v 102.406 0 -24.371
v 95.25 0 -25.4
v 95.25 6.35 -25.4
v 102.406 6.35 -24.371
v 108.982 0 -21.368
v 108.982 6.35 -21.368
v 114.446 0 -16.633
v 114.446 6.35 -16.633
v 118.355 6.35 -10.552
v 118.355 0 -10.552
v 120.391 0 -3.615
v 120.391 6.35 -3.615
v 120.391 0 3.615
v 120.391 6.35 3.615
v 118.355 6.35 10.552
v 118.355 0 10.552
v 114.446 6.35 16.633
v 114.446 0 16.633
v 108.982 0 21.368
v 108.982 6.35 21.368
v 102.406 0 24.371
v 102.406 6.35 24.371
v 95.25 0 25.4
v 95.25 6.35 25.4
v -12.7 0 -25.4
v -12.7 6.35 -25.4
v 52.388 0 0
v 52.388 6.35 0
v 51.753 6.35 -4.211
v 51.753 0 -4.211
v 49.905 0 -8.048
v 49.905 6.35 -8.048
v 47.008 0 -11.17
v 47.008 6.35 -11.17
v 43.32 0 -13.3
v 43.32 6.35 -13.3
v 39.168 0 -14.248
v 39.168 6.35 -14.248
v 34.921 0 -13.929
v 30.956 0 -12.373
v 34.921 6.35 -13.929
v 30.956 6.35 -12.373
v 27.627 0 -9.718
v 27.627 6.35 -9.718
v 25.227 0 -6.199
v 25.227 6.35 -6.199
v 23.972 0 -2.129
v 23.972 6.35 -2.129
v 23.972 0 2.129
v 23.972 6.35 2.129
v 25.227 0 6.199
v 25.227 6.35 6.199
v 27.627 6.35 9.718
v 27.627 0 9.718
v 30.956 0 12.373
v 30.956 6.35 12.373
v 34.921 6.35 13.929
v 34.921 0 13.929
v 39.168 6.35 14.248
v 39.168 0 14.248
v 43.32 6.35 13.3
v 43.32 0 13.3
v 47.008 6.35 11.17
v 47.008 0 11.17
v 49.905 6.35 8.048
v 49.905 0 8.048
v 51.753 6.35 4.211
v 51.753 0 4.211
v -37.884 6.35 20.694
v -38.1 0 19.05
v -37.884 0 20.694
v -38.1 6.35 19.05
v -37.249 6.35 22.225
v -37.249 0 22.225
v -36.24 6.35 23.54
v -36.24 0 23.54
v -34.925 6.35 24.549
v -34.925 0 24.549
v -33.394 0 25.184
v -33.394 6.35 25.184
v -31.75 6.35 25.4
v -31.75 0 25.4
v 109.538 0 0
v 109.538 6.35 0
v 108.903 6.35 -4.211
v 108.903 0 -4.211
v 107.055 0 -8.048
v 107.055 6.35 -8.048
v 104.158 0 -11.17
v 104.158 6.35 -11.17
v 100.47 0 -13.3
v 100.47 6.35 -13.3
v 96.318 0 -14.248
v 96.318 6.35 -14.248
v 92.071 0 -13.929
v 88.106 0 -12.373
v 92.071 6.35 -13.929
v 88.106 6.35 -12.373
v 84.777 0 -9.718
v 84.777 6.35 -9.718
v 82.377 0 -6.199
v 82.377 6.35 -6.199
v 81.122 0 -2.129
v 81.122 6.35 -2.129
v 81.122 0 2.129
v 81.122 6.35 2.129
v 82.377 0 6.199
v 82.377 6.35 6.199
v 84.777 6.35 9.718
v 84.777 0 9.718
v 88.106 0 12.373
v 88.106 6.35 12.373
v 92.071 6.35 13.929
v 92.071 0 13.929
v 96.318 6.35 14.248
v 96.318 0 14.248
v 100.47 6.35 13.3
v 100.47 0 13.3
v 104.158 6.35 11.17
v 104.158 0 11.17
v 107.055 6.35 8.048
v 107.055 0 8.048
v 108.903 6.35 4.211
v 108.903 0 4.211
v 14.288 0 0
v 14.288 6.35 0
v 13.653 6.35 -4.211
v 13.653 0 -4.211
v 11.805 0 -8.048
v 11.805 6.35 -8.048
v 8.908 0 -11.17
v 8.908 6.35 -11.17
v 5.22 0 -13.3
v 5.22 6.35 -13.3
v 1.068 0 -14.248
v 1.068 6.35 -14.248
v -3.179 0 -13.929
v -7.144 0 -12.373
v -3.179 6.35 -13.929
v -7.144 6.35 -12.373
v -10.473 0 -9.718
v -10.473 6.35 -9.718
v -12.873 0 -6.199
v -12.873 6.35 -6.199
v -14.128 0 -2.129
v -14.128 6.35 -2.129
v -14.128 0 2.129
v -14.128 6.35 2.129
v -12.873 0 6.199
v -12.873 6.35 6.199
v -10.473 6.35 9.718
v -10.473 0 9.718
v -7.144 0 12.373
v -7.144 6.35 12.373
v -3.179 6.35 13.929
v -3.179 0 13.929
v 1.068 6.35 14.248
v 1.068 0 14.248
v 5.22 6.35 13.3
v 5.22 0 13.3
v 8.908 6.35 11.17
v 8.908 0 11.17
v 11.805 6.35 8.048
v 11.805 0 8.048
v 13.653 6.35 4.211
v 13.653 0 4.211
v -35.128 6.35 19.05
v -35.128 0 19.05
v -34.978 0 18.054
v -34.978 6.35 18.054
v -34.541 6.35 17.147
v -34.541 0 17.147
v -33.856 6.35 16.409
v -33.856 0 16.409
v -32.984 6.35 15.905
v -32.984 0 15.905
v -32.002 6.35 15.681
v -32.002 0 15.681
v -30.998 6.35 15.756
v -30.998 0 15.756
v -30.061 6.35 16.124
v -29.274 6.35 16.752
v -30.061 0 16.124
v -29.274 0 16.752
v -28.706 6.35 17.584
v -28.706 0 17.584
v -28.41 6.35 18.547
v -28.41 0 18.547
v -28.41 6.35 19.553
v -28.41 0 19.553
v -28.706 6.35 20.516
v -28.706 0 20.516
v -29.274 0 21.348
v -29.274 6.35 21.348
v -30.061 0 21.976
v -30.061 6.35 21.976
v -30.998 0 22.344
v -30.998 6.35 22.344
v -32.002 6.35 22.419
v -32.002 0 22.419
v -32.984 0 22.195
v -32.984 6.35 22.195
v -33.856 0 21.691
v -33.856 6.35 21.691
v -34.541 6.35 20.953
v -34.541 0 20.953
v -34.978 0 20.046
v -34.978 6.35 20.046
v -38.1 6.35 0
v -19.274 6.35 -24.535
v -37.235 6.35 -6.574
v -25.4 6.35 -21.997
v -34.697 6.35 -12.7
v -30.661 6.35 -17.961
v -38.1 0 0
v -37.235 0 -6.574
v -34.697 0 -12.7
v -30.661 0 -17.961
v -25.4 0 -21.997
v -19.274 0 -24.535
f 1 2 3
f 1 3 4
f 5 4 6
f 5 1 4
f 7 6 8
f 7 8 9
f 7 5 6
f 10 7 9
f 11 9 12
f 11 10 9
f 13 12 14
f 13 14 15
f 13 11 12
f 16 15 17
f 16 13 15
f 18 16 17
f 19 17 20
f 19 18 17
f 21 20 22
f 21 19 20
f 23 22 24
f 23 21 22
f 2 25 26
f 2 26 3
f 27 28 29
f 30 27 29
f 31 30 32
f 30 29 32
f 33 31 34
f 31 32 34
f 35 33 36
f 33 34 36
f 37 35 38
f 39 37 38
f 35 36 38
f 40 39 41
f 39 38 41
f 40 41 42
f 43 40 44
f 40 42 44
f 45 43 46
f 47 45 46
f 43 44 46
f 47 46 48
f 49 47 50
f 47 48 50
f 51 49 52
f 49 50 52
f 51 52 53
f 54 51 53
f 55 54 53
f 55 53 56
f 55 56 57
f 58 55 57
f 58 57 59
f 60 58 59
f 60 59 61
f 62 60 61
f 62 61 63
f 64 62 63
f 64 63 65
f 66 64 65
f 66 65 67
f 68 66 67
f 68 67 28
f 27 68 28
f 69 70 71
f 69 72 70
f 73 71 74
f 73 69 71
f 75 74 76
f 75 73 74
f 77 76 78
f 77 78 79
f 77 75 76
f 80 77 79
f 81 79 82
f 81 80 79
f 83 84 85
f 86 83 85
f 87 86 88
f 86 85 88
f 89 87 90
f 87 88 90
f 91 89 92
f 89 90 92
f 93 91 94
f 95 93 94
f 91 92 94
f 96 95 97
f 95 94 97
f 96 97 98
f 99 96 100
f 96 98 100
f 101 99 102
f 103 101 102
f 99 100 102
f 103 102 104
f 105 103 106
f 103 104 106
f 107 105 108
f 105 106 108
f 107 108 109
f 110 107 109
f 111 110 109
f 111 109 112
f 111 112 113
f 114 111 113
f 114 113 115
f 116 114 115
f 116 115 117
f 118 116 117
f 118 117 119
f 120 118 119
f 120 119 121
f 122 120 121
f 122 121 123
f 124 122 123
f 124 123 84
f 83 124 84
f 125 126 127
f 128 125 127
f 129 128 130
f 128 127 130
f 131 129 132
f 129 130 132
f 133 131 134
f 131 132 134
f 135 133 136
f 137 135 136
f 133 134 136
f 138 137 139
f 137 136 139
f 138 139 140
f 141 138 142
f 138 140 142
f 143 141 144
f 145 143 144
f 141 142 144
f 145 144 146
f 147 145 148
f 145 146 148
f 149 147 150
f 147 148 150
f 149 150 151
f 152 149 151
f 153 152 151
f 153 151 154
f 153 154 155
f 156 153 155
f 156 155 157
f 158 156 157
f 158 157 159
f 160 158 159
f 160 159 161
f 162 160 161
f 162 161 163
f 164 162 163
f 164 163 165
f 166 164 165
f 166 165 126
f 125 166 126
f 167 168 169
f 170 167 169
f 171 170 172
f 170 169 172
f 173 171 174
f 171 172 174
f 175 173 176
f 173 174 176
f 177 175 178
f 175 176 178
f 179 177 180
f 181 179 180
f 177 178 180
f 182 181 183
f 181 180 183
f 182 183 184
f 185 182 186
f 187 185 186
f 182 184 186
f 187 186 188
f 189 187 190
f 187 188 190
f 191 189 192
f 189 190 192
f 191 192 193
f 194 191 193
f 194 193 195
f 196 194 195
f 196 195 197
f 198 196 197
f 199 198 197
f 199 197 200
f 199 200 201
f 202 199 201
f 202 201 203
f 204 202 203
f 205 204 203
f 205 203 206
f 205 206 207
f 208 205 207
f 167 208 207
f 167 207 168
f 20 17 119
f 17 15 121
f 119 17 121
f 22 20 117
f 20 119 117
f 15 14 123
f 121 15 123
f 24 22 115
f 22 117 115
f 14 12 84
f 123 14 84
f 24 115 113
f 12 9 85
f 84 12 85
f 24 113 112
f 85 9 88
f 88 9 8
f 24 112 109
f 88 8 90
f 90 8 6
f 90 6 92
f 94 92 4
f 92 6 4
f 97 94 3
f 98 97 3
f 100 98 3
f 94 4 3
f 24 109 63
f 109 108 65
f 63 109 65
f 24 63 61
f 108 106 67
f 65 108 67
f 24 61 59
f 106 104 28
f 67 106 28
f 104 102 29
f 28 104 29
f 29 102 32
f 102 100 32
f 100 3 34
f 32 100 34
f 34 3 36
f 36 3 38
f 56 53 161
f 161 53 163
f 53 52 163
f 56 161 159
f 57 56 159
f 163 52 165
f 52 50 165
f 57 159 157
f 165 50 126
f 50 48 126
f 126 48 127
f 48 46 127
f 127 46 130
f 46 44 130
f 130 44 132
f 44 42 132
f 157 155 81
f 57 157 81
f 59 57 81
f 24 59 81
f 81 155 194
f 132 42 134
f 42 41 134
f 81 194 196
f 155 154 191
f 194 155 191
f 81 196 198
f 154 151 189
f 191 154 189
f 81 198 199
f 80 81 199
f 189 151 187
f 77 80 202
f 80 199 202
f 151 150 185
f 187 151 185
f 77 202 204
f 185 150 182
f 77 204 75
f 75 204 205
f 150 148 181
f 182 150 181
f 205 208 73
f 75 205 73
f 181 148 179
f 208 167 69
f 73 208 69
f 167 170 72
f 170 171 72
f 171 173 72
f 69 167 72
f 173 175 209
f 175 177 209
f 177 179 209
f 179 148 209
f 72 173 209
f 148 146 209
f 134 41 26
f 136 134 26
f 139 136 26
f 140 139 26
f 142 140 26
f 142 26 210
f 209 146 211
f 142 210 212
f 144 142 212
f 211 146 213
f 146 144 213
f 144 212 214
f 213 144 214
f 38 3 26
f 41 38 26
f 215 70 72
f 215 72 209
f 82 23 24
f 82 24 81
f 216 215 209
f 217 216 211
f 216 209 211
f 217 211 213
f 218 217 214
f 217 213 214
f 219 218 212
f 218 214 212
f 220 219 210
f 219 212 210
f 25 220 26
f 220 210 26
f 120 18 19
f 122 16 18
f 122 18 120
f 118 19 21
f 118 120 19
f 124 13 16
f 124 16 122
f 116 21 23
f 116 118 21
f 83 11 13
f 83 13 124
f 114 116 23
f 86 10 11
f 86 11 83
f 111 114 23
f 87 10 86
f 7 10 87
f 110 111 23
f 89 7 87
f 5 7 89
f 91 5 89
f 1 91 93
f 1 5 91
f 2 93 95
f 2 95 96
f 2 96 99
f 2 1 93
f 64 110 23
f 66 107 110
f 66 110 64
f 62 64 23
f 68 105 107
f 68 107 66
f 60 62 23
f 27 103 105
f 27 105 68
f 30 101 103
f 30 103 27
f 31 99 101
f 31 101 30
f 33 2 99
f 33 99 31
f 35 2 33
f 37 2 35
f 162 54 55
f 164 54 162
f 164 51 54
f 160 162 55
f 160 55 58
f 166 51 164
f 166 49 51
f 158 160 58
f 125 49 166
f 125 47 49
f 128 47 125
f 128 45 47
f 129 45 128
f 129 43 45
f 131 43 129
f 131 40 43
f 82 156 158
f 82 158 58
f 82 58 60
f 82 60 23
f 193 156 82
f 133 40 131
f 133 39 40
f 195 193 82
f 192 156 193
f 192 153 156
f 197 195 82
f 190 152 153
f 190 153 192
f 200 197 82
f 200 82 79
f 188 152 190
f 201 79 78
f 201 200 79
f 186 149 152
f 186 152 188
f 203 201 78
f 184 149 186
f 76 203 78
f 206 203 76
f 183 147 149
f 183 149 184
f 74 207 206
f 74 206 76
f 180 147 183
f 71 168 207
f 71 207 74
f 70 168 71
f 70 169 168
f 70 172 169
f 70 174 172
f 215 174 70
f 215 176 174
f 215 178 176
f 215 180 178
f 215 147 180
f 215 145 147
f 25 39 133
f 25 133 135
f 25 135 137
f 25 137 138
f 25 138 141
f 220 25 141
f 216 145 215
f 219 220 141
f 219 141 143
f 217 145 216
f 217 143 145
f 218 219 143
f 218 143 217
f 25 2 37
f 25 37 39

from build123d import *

# Parameters (mm, degrees)
BOSS_EXTRUDE1_DEPTH     = 6.35
SKETCH2_R               = 14.2875
CUT_EXTRUDE1_DEPTH      = 7.35
F_1_4_CLEARANCE_HOLE1_D = 6.7564
FILLET1_R               = 6.35
FILLET2_R               = 25.4


with BuildPart() as part:
    # Sketch1 → Boss-Extrude1 (new body)
    with BuildSketch(Plane(origin=(0, 0, 0), x_dir=(1, 0, 0), z_dir=(0, 1, 0))):
        with BuildLine():
            Line((-38.1, 25.4), (95.25, 25.4))
            ThreePointArc((95.25, 25.4), (120.65, 0), (95.25, -25.4))
            Line((95.25, -25.4), (-38.1, -25.4))
            Line((-38.1, -25.4), (-38.1, 25.4))
        make_face()
    extrude(amount=BOSS_EXTRUDE1_DEPTH)

    # Sketch2 → Cut-Extrude1 (cut, through all)
    with BuildSketch(Plane(origin=(0, 6.35, 0), x_dir=(1, 0, 0), z_dir=(0, 1, 0))):
        with Locations((38.1, 0)):
            Circle(SKETCH2_R)
        with Locations((95.25, 0)):
            Circle(SKETCH2_R)
        Circle(SKETCH2_R)
    extrude(amount=-CUT_EXTRUDE1_DEPTH, mode=Mode.SUBTRACT)

    # 1/4 Clearance Hole1 (through all)
    with Locations(Plane(origin=(0, 6.35, 0), x_dir=(1, 0, 0), z_dir=(0, 1, 0))):
        with Locations((-31.75, -19.05)):
            Hole(F_1_4_CLEARANCE_HOLE1_D / 2)

    # Fillet1
    fillet1_edges = [part.edges().sort_by_distance(p)[0] for p in [
        (-38.1, 3.175, 25.4),
    ]]
    fillet(fillet1_edges, radius=FILLET1_R)

    # Fillet2
    fillet2_edges = [part.edges().sort_by_distance(p)[0] for p in [
        (-38.1, 3.175, -25.4),
    ]]
    fillet(fillet2_edges, radius=FILLET2_R)


solid = part.part
